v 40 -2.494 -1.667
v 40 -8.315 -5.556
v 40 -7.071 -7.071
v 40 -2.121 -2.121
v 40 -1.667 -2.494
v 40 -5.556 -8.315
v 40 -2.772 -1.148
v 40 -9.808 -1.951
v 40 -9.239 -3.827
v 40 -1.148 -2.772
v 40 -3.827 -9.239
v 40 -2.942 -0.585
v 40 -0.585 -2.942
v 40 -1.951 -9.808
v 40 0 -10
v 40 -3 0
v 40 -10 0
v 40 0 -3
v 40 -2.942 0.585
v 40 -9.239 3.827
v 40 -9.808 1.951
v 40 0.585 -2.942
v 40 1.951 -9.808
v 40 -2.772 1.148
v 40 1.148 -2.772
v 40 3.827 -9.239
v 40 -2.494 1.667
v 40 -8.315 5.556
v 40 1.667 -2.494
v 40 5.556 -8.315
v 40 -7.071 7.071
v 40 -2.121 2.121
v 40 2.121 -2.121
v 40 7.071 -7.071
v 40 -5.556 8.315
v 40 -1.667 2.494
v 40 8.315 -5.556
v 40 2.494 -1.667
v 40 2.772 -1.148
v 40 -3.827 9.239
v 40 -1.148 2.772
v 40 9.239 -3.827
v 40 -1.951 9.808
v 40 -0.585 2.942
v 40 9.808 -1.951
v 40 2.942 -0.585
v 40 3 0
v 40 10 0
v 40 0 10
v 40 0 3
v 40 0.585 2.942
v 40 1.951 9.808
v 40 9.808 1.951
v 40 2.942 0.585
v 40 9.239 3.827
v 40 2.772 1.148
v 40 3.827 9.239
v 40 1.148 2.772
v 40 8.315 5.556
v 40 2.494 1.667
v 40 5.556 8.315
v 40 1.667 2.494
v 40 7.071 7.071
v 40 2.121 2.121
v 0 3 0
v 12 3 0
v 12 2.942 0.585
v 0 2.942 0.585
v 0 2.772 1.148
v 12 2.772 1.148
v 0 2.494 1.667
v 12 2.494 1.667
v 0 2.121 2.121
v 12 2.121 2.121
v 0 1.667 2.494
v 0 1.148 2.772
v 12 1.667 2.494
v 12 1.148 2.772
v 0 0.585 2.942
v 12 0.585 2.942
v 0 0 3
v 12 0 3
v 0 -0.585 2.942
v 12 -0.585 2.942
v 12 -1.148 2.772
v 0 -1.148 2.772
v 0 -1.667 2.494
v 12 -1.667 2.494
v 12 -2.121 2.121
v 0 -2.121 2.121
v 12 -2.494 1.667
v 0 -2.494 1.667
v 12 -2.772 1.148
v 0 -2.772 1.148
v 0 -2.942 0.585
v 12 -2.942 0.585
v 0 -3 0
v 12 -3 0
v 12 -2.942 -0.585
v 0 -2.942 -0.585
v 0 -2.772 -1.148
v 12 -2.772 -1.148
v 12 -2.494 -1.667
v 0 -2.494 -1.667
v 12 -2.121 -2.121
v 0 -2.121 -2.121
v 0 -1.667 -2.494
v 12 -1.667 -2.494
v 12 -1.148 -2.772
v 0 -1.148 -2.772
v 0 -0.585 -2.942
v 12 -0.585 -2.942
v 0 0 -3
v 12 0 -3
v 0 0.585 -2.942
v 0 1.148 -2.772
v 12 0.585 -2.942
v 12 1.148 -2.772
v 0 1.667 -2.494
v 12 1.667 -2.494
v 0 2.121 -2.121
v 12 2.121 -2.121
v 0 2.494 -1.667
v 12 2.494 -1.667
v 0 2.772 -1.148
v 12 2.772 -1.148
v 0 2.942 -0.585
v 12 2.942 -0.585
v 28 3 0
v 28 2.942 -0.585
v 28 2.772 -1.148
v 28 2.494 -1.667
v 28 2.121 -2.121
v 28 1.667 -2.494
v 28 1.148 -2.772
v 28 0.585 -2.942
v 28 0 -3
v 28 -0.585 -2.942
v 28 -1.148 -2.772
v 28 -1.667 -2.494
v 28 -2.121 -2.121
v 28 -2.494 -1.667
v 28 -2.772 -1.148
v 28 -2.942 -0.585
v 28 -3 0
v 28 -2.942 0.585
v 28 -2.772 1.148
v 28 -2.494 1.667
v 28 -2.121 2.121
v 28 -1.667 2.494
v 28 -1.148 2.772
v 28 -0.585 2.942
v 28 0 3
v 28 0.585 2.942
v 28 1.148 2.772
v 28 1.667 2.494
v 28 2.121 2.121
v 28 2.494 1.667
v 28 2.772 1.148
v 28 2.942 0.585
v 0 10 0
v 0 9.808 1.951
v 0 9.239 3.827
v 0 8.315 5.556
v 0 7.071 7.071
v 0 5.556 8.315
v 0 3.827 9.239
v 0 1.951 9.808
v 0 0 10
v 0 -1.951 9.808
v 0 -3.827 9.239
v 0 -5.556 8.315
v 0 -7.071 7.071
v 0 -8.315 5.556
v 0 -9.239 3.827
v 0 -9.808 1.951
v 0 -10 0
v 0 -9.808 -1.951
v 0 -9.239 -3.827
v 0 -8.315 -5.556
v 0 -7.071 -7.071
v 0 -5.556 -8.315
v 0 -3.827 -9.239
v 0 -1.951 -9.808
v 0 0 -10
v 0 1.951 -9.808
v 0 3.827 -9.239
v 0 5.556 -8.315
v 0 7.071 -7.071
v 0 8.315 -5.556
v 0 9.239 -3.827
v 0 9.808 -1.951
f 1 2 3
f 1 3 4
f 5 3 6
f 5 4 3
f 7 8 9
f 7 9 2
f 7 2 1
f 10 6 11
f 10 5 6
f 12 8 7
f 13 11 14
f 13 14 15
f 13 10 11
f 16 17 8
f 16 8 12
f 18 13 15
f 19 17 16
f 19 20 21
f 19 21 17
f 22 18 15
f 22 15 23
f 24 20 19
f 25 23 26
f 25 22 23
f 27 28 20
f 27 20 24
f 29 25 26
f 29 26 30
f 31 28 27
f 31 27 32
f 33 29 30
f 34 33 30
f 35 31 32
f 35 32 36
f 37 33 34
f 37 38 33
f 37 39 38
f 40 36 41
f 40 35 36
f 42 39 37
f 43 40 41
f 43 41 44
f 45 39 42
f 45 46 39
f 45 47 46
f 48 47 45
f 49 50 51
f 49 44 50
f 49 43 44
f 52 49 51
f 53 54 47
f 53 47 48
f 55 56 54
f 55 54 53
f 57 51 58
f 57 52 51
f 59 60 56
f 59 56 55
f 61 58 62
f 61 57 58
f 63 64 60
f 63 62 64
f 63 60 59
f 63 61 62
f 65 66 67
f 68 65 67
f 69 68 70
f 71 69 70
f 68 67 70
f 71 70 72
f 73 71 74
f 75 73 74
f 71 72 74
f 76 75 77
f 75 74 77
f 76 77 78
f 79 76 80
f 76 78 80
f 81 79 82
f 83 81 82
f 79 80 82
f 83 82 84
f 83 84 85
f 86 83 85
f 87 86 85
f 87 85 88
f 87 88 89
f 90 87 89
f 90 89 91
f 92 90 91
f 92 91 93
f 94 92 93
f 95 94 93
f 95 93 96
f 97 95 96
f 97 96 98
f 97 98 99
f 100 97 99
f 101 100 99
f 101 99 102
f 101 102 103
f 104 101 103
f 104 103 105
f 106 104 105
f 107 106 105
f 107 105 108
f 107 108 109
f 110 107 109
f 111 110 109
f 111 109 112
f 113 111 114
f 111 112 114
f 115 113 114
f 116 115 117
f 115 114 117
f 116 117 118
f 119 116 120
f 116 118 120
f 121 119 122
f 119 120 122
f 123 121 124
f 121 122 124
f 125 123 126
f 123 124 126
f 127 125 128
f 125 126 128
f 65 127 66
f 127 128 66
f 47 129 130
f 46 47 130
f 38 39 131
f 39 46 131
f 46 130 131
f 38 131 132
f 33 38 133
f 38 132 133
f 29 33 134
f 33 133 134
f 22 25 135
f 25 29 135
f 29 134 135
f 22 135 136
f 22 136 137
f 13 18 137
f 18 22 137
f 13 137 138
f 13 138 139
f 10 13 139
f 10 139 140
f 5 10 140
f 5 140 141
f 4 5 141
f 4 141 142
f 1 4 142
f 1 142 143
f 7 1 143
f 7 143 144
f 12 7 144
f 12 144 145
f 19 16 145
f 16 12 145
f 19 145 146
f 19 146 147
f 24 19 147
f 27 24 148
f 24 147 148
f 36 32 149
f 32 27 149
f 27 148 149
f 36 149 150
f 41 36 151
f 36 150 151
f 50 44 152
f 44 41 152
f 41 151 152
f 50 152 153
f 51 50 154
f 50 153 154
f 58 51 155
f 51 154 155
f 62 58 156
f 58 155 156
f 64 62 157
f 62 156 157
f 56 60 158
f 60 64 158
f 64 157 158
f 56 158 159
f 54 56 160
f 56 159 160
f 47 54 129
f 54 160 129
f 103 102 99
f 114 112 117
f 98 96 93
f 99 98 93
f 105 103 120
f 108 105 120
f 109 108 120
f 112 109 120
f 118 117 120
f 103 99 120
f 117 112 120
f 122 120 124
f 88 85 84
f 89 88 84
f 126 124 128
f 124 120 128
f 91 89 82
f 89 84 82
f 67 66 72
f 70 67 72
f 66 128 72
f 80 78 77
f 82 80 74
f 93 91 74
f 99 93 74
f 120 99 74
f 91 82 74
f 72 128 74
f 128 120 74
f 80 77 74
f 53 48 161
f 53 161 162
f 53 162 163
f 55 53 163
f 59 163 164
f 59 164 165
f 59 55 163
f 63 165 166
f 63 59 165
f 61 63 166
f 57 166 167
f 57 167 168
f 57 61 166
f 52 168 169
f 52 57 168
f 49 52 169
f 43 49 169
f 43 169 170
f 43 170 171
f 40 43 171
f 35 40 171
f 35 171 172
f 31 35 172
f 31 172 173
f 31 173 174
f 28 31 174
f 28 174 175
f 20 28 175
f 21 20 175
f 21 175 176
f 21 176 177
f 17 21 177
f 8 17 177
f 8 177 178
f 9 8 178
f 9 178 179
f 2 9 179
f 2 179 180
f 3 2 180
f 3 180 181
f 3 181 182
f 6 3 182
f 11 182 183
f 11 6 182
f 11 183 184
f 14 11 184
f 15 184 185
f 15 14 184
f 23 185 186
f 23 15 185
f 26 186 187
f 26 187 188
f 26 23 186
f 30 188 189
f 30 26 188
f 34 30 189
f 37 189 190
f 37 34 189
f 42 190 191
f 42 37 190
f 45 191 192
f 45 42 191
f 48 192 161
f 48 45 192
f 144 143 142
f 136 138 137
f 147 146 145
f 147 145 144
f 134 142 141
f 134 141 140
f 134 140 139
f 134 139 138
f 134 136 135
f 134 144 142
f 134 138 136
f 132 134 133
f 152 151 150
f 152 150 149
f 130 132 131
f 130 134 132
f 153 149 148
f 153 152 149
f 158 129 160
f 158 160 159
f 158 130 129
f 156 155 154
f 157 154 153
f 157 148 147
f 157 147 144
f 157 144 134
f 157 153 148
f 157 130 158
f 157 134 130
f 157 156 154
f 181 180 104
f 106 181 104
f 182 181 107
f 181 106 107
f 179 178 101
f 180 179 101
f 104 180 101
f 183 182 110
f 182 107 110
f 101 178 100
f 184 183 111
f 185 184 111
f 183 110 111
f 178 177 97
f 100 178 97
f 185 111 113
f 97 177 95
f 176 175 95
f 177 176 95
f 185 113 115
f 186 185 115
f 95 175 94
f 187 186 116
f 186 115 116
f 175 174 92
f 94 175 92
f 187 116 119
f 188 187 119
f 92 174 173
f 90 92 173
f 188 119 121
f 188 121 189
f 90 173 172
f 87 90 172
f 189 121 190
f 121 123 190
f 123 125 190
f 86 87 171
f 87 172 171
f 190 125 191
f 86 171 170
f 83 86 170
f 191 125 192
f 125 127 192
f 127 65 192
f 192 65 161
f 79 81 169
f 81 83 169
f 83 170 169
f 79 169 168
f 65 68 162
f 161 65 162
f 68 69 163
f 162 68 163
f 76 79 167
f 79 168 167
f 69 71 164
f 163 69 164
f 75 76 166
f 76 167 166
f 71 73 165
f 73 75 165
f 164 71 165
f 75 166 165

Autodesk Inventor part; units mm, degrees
ref_plane "Start Plane" through (0, 0, 0) normal (1, 0, 0) x (0, 1, 0)
ref_plane "XZ Plane" through (0, 0, 0) normal (0, 1, 0) x (-1, 0, 0)
ref_plane "XY Plane" through (0, 0, 0) normal (0, 0, 1) x (1, 0, 0)
sketch "Main Sketch" plane through (0, 0, 0) normal (0, 0, 1) x (1, 0, 0)
  line L0 (0, 0) -> (40, 0)
  line L1 (0, 3) -> (0, 10)
  line L2 (40, 10) -> (40, 3)
  line L3 (0, 10) -> (40, 10)
  line L4 (12, 3) -> (12, 0)
  line L5 (0, 3) -> (12, 3)
  line L6 (28, 3) -> (28, 0)
  line L7 (40, 3) -> (28, 3)
  line L8 (12, 0) -> (28, 0)
  dimension "d3" = 20
  dimension "d4" = 6
  dimension "d5" = 6
revolve "Revolution1" add sketch "Main Sketch" angle 360 about axis through (0, 0, 0) along (1, 0, 0)
equation "\"Length\" = 40"
properties part number "Shaft" material "Aluminum 6061"
